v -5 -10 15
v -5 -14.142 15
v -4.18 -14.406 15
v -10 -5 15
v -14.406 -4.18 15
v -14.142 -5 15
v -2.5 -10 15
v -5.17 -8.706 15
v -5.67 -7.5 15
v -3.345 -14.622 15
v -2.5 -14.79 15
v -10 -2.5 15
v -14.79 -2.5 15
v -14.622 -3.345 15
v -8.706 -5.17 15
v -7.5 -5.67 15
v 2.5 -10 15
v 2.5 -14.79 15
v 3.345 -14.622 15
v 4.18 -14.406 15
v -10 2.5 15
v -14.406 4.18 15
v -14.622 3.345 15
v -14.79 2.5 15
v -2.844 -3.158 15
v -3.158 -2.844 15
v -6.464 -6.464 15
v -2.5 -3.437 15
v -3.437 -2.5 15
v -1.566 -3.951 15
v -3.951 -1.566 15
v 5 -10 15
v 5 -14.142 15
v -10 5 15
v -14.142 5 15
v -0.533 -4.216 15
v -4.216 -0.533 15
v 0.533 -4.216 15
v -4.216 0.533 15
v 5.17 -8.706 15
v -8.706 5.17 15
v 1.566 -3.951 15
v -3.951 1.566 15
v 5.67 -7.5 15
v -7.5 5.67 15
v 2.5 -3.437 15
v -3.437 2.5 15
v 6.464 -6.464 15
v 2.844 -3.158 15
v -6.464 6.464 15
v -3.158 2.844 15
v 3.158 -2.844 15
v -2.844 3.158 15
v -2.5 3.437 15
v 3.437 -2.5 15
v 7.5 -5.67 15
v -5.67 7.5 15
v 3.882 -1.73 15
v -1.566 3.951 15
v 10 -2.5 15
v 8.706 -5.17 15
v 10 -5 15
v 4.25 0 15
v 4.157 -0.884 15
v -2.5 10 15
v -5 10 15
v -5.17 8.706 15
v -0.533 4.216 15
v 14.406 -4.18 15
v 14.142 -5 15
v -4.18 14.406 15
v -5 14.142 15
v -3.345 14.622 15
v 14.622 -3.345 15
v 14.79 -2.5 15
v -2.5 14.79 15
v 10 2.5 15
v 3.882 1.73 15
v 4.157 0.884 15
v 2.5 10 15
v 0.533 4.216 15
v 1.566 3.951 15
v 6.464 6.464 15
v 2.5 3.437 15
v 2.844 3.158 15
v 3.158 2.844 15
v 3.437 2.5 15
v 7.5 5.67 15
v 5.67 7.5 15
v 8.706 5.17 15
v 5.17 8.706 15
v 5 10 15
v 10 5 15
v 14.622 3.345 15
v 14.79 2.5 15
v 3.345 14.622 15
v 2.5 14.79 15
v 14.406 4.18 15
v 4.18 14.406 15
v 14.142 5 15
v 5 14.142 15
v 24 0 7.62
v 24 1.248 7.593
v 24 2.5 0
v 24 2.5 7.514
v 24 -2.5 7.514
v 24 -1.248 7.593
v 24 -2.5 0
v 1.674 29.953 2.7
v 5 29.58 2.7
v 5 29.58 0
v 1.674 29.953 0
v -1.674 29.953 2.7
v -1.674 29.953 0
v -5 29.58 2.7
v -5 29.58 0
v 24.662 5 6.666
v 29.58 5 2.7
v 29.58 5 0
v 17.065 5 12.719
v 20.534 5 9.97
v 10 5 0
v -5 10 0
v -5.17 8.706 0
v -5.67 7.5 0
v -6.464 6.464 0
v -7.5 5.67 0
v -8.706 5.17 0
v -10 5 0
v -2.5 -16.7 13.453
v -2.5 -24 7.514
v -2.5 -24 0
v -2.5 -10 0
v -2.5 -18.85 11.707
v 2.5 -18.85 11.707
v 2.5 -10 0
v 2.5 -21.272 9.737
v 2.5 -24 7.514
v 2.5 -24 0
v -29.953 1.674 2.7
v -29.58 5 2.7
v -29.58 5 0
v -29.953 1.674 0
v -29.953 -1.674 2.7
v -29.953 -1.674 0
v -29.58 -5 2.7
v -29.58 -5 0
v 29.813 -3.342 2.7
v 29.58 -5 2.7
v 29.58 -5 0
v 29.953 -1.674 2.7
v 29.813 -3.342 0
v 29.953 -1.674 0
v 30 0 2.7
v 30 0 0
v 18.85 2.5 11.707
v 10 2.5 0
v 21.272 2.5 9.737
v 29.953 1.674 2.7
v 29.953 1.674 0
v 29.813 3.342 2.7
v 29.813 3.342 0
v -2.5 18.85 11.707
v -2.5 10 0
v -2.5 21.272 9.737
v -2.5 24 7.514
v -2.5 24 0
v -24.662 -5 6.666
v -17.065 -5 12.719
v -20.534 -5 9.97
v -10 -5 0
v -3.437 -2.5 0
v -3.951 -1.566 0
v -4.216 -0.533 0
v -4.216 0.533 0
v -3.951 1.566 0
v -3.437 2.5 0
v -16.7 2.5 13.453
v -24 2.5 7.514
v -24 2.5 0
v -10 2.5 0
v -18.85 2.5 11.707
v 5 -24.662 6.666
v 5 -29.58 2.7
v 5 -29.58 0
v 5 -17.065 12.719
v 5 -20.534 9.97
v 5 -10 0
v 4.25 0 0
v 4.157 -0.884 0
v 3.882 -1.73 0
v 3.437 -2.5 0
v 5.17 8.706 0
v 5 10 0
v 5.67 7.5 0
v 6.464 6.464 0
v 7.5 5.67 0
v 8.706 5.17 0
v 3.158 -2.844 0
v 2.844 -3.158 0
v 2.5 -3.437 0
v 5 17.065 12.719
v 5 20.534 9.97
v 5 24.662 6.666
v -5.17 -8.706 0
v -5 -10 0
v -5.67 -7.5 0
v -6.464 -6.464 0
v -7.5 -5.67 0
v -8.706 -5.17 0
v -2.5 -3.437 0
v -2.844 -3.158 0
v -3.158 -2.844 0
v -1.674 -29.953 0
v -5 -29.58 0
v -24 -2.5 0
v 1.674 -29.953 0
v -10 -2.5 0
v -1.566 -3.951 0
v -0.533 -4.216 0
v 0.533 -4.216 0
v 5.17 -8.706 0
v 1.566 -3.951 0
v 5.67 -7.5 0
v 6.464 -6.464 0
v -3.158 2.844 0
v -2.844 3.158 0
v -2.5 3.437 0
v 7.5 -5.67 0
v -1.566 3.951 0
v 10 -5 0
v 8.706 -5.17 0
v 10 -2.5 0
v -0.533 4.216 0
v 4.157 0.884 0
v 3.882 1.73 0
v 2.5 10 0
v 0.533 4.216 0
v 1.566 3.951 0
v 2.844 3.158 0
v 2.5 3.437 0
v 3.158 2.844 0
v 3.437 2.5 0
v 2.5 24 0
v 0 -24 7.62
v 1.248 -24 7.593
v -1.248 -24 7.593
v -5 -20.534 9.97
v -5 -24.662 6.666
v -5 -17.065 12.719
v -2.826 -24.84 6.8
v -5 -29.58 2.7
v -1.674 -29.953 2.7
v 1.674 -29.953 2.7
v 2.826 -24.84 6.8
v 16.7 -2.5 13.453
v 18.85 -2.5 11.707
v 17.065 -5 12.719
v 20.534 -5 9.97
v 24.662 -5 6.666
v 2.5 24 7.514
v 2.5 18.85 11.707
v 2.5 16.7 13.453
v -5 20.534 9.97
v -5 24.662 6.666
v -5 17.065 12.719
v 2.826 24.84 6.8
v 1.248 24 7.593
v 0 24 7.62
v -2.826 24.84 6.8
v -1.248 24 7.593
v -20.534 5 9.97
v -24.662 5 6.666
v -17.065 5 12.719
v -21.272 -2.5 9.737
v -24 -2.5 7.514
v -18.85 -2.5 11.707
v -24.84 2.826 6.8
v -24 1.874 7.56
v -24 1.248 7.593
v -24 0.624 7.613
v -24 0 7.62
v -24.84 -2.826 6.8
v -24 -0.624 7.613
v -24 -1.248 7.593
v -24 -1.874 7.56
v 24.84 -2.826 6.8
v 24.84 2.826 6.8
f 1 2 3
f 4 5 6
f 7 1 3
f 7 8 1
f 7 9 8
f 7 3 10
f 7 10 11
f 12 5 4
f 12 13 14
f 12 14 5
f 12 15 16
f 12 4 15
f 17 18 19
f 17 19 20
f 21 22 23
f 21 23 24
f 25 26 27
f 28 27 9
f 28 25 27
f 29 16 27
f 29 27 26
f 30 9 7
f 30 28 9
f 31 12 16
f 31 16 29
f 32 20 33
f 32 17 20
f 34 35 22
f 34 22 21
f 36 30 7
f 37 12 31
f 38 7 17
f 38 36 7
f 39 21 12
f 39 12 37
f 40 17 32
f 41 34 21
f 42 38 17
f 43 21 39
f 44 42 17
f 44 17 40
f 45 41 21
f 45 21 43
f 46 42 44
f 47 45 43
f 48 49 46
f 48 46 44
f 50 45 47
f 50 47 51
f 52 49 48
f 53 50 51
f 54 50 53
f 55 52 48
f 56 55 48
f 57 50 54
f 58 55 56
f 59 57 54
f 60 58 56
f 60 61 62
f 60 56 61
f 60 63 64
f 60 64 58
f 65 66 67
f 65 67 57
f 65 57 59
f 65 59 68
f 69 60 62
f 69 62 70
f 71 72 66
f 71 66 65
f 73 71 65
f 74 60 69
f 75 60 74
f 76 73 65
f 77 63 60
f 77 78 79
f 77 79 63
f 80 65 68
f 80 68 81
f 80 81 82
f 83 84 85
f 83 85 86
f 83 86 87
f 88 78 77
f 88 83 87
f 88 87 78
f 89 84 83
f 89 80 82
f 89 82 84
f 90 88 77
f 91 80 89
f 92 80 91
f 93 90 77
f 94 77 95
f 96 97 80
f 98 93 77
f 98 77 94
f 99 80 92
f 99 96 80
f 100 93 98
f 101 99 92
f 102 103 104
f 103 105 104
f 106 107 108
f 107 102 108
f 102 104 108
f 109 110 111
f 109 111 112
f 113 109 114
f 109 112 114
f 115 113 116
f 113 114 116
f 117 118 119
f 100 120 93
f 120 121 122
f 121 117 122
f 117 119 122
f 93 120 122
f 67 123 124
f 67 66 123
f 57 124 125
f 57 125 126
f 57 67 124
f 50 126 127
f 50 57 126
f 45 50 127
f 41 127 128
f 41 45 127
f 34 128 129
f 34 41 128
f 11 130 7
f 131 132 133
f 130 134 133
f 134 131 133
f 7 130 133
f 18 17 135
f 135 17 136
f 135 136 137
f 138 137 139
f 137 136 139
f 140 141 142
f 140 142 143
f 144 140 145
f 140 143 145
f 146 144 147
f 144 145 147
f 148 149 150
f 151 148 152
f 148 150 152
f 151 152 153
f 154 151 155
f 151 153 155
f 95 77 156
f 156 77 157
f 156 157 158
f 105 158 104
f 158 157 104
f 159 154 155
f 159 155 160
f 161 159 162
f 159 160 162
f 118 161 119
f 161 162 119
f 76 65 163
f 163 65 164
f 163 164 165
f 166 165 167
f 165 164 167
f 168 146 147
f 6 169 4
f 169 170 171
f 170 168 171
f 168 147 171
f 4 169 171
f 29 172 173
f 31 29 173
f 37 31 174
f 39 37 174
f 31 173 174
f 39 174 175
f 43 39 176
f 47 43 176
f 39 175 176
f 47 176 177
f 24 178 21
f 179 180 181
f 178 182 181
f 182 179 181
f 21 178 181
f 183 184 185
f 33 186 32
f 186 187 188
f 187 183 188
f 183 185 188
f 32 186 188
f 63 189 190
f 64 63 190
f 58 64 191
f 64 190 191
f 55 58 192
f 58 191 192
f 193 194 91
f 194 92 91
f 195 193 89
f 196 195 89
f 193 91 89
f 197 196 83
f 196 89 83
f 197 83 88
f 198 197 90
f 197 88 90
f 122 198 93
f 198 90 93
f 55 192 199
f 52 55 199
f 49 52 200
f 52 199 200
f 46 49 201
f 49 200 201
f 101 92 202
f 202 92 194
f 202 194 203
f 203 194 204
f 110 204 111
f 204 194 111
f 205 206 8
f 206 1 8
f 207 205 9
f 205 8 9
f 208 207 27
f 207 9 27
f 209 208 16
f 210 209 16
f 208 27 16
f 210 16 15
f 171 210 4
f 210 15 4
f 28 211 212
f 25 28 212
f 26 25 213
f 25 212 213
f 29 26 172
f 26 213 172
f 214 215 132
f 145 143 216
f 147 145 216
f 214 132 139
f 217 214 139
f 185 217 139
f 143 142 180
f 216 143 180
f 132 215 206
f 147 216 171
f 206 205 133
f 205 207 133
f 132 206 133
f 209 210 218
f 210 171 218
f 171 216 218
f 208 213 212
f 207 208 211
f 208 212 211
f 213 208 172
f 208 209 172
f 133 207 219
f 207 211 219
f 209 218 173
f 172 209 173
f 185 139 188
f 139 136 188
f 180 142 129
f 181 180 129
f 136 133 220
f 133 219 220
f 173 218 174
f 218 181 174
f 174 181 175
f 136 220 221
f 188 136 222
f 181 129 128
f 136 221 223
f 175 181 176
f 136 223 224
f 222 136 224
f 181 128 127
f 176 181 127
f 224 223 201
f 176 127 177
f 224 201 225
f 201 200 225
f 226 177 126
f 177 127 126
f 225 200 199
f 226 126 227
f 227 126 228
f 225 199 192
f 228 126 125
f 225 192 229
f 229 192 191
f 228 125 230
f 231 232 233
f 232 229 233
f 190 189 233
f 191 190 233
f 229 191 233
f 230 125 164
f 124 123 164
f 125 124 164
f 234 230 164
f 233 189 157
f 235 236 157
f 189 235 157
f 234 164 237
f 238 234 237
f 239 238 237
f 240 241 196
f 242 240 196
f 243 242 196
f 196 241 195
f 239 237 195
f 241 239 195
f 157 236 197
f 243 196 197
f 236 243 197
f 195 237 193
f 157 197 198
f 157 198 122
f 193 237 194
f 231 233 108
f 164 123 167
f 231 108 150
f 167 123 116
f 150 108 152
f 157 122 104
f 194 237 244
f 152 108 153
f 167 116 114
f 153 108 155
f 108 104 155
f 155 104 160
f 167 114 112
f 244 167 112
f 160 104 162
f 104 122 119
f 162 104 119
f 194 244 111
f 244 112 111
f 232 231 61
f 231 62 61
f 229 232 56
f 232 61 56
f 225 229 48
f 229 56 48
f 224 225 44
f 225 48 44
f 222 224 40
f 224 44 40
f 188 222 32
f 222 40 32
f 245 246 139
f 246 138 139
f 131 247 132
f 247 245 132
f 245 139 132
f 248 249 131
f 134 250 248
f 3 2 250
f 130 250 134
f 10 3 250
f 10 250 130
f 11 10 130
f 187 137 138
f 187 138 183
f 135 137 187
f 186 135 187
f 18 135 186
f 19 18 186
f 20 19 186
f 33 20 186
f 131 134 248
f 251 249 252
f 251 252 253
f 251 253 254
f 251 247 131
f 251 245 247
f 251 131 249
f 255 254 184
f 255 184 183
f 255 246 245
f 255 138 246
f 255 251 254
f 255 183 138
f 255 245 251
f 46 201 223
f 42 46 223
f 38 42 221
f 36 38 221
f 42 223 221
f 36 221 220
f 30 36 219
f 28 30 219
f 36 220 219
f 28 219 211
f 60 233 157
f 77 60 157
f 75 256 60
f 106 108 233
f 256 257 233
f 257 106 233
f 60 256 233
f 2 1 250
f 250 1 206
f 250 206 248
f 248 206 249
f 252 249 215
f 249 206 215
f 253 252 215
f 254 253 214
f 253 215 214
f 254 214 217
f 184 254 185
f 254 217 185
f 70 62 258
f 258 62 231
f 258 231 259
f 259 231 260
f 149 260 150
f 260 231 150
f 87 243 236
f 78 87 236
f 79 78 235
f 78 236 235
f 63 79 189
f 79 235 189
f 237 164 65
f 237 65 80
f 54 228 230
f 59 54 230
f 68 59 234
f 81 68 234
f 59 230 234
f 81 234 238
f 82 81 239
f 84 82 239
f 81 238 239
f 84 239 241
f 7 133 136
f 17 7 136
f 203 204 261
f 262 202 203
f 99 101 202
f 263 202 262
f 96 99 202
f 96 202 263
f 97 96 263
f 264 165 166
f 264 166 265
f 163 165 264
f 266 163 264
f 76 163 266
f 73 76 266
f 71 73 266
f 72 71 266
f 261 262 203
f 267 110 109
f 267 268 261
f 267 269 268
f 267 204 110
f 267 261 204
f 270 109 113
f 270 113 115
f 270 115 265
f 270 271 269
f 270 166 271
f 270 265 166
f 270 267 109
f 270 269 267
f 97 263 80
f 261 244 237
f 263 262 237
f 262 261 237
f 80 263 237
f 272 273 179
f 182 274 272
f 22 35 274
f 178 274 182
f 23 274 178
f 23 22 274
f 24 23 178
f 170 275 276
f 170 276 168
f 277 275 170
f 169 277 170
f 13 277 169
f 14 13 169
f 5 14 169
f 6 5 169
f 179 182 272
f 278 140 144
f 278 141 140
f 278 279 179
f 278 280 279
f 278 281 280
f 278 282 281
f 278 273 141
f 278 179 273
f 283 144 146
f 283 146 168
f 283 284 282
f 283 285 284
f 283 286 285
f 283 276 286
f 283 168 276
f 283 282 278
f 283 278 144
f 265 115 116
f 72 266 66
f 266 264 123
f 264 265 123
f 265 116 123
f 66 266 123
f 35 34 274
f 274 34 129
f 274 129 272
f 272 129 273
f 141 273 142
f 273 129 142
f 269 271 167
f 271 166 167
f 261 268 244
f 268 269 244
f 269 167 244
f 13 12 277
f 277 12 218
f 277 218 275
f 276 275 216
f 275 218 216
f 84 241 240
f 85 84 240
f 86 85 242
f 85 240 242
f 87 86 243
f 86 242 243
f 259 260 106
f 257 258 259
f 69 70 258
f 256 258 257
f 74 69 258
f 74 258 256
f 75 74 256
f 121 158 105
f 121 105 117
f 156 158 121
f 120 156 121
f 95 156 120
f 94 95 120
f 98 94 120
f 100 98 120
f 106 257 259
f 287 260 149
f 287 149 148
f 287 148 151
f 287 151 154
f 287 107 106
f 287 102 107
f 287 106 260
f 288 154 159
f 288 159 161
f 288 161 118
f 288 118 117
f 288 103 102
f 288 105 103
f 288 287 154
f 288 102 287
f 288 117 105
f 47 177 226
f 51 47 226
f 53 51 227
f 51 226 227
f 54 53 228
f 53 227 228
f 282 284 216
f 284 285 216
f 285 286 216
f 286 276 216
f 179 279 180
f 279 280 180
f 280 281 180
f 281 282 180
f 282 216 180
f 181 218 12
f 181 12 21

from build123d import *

# Parameters (mm, degrees)
F1_W     = 5
F1_H     = 2.5
F1_W_2   = 2.5
F1_H_2   = 5
F2_DEPTH = 15
F5_R     = 5


with BuildPart() as f2:
    # F1 (on Top) → F2 (new body)
    with BuildSketch(Plane.XY):
        with BuildLine():
            ThreePointArc((-26.0240273593, -5), (-26.5, 0), (-26.0240273593, 5))
            Line((-26.0240273593, 5), (-29.5803989155, 5))
            ThreePointArc((-29.5803989155, 5), (-30, 0), (-29.5803989155, -5))
            Line((-29.5803989155, -5), (-26.0240273593, -5))
        make_face()
        with BuildLine():
            Line((-24, 2.5), (-10, 2.5))
            Line((-10, 2.5), (-10, 5))
            Line((-10, 5), (-26.0240273593, 5))
            ThreePointArc((-26.0240273593, 5), (-26.5, 0), (-26.0240273593, -5))
            Line((-26.0240273593, -5), (-10, -5))
            Line((-10, -5), (-10, -2.5))
            Line((-10, -2.5), (-24, -2.5))
            Line((-24, -2.5), (-24, 2.5))
        make_face()
        with BuildLine():
            Line((5, -10), (2.5, -10))
            Line((2.5, -10), (2.5, -24))
            Line((2.5, -24), (-2.5, -24))
            Line((-2.5, -24), (-2.5, -10))
            Line((-2.5, -10), (-5, -10))
            Line((-5, -10), (-5, -26.0240273593))
            ThreePointArc((-5, -26.0240273593), (0, -26.5), (5, -26.0240273593))
            Line((5, -26.0240273593), (5, -10))
        make_face()
        with BuildLine():
            Line((10, 5), (10, 2.5))
            Line((10, 2.5), (24, 2.5))
            Line((24, 2.5), (24, -2.5))
            Line((24, -2.5), (10, -2.5))
            Line((10, -2.5), (10, -5))
            Line((10, -5), (26.0240273593, -5))
            ThreePointArc((26.0240273593, -5), (26.3807384755, -2.5113019509), (26.5, 0))
            ThreePointArc((26.5, 0), (26.3807384755, 2.5113019509), (26.0240273593, 5))
            Line((26.0240273593, 5), (10, 5))
        make_face()
        with BuildLine():
            Line((2.5, 24), (2.5, 10))
            Line((2.5, 10), (5, 10))
            Line((5, 10), (5, 26.0240273593))
            ThreePointArc((5, 26.0240273593), (0, 26.5), (-5, 26.0240273593))
            Line((-5, 26.0240273593), (-5, 10))
            Line((-5, 10), (-2.5, 10))
            Line((-2.5, 10), (-2.5, 24))
            Line((-2.5, 24), (2.5, 24))
        make_face()
        with BuildLine():
            ThreePointArc((-5, 26.0240273593), (0, 26.5), (5, 26.0240273593))
            Line((5, 26.0240273593), (5, 29.5803989155))
            ThreePointArc((5, 29.5803989155), (0, 30), (-5, 29.5803989155))
            Line((-5, 29.5803989155), (-5, 26.0240273593))
        make_face()
        with BuildLine():
            Line((29.5803989155, 5), (26.0240273593, 5))
            ThreePointArc((26.0240273593, 5), (26.3807384755, 2.5113019509), (26.5, 0))
            ThreePointArc((26.5, 0), (26.3807384755, -2.5113019509), (26.0240273593, -5))
            Line((26.0240273593, -5), (29.5803989155, -5))
            ThreePointArc((29.5803989155, -5), (29.8949156836, -2.5087878084), (30, 0))
            ThreePointArc((30, 0), (29.8949156836, 2.5087878084), (29.5803989155, 5))
        make_face()
        with BuildLine():
            ThreePointArc((2.5, 3.4369317712), (3.00520382, 3.00520382), (3.4369317712, 2.5))
            Line((3.4369317712, 2.5), (5, 2.5))
            Line((5, 2.5), (5, 5))
            Line((5, 5), (2.5, 5))
            Line((2.5, 5), (2.5, 3.4369317712))
        make_face()
        with BuildLine():
            ThreePointArc((-2.5, 3.4369317712), (0, 4.25), (2.5, 3.4369317712))
            Line((2.5, 3.4369317712), (2.5, 5))
            Line((2.5, 5), (-2.5, 5))
            Line((-2.5, 5), (-2.5, 3.4369317712))
        make_face()
        with BuildLine():
            ThreePointArc((-3.4369317712, 2.5), (-3.00520382, 3.00520382), (-2.5, 3.4369317712))
            Line((-2.5, 3.4369317712), (-2.5, 5))
            Line((-2.5, 5), (-5, 5))
            Line((-5, 5), (-5, 2.5))
            Line((-5, 2.5), (-3.4369317712, 2.5))
        make_face()
        with BuildLine():
            ThreePointArc((-3.4369317712, -2.5), (-4.25, 0), (-3.4369317712, 2.5))
            Line((-3.4369317712, 2.5), (-5, 2.5))
            Line((-5, 2.5), (-5, -2.5))
            Line((-5, -2.5), (-3.4369317712, -2.5))
        make_face()
        with BuildLine():
            Line((-2.5, -5), (-2.5, -3.4369317712))
            ThreePointArc((-2.5, -3.4369317712), (-3.00520382, -3.00520382), (-3.4369317712, -2.5))
            Line((-3.4369317712, -2.5), (-5, -2.5))
            Line((-5, -2.5), (-5, -5))
            Line((-5, -5), (-2.5, -5))
        make_face()
        with BuildLine():
            Line((2.5, -5), (2.5, -3.4369317712))
            ThreePointArc((2.5, -3.4369317712), (0, -4.25), (-2.5, -3.4369317712))
            Line((-2.5, -3.4369317712), (-2.5, -5))
            Line((-2.5, -5), (2.5, -5))
        make_face()
        with BuildLine():
            Line((5, -2.5), (3.4369317712, -2.5))
            ThreePointArc((3.4369317712, -2.5), (3.00520382, -3.00520382), (2.5, -3.4369317712))
            Line((2.5, -3.4369317712), (2.5, -5))
            Line((2.5, -5), (5, -5))
            Line((5, -5), (5, -2.5))
        make_face()
        with BuildLine():
            ThreePointArc((3.4369317712, 2.5), (4.041624675, 1.3144466464), (4.25, 0))
            ThreePointArc((4.25, 0), (4.041624675, -1.3144466464), (3.4369317712, -2.5))
            Line((3.4369317712, -2.5), (5, -2.5))
            Line((5, -2.5), (5, 2.5))
            Line((5, 2.5), (3.4369317712, 2.5))
        make_face()
        with BuildLine():
            Line((5, -29.5803989155), (5, -26.0240273593))
            ThreePointArc((5, -26.0240273593), (0, -26.5), (-5, -26.0240273593))
            Line((-5, -26.0240273593), (-5, -29.5803989155))
            ThreePointArc((-5, -29.5803989155), (0, -30), (5, -29.5803989155))
        make_face()
        with Locations((-7.5, 3.75)):
            Rectangle(F1_W, F1_H)
        with Locations((7.5, 3.75)):
            Rectangle(F1_W, F1_H)
        with Locations((3.75, -7.5)):
            Rectangle(F1_W_2, F1_H_2)
        with Locations((0, -7.5)):
            Rectangle(F1_W, F1_H_2)
        with Locations((-3.75, -7.5)):
            Rectangle(F1_W_2, F1_H_2)
        with Locations((-7.5, -3.75)):
            Rectangle(F1_W, F1_H)
        with Locations((7.5, -3.75)):
            Rectangle(F1_W, F1_H)
        with Locations((3.75, 7.5)):
            Rectangle(F1_W_2, F1_H_2)
        with Locations((0, 7.5)):
            Rectangle(F1_W, F1_H_2)
        with Locations((-7.5, 0)):
            Rectangle(F1_W, F1_H_2)
        with Locations((7.5, 0)):
            Rectangle(F1_W, F1_H_2)
        with Locations((-3.75, 7.5)):
            Rectangle(F1_W_2, F1_H_2)
    extrude(amount=F2_DEPTH)

    # F3 (on Front) → F4 (revolve, cut)
    with BuildSketch(Plane.XZ):
        Polygon((-30, 15), (-30, 2.7), (-15, 15), align=None)
    revolve(axis=Axis((0, 0, 7.5), (0, 0, 1)), mode=Mode.SUBTRACT)

    # F5
    f5_edges = [f2.edges().sort_by_distance(p)[0] for p in [
        (5, 5, 7.5),
        (5, -5, 7.5),
        (-5, -5, 7.5),
        (-5, 5, 7.5),
    ]]
    fillet(f5_edges, radius=F5_R)


solid = f2.part
